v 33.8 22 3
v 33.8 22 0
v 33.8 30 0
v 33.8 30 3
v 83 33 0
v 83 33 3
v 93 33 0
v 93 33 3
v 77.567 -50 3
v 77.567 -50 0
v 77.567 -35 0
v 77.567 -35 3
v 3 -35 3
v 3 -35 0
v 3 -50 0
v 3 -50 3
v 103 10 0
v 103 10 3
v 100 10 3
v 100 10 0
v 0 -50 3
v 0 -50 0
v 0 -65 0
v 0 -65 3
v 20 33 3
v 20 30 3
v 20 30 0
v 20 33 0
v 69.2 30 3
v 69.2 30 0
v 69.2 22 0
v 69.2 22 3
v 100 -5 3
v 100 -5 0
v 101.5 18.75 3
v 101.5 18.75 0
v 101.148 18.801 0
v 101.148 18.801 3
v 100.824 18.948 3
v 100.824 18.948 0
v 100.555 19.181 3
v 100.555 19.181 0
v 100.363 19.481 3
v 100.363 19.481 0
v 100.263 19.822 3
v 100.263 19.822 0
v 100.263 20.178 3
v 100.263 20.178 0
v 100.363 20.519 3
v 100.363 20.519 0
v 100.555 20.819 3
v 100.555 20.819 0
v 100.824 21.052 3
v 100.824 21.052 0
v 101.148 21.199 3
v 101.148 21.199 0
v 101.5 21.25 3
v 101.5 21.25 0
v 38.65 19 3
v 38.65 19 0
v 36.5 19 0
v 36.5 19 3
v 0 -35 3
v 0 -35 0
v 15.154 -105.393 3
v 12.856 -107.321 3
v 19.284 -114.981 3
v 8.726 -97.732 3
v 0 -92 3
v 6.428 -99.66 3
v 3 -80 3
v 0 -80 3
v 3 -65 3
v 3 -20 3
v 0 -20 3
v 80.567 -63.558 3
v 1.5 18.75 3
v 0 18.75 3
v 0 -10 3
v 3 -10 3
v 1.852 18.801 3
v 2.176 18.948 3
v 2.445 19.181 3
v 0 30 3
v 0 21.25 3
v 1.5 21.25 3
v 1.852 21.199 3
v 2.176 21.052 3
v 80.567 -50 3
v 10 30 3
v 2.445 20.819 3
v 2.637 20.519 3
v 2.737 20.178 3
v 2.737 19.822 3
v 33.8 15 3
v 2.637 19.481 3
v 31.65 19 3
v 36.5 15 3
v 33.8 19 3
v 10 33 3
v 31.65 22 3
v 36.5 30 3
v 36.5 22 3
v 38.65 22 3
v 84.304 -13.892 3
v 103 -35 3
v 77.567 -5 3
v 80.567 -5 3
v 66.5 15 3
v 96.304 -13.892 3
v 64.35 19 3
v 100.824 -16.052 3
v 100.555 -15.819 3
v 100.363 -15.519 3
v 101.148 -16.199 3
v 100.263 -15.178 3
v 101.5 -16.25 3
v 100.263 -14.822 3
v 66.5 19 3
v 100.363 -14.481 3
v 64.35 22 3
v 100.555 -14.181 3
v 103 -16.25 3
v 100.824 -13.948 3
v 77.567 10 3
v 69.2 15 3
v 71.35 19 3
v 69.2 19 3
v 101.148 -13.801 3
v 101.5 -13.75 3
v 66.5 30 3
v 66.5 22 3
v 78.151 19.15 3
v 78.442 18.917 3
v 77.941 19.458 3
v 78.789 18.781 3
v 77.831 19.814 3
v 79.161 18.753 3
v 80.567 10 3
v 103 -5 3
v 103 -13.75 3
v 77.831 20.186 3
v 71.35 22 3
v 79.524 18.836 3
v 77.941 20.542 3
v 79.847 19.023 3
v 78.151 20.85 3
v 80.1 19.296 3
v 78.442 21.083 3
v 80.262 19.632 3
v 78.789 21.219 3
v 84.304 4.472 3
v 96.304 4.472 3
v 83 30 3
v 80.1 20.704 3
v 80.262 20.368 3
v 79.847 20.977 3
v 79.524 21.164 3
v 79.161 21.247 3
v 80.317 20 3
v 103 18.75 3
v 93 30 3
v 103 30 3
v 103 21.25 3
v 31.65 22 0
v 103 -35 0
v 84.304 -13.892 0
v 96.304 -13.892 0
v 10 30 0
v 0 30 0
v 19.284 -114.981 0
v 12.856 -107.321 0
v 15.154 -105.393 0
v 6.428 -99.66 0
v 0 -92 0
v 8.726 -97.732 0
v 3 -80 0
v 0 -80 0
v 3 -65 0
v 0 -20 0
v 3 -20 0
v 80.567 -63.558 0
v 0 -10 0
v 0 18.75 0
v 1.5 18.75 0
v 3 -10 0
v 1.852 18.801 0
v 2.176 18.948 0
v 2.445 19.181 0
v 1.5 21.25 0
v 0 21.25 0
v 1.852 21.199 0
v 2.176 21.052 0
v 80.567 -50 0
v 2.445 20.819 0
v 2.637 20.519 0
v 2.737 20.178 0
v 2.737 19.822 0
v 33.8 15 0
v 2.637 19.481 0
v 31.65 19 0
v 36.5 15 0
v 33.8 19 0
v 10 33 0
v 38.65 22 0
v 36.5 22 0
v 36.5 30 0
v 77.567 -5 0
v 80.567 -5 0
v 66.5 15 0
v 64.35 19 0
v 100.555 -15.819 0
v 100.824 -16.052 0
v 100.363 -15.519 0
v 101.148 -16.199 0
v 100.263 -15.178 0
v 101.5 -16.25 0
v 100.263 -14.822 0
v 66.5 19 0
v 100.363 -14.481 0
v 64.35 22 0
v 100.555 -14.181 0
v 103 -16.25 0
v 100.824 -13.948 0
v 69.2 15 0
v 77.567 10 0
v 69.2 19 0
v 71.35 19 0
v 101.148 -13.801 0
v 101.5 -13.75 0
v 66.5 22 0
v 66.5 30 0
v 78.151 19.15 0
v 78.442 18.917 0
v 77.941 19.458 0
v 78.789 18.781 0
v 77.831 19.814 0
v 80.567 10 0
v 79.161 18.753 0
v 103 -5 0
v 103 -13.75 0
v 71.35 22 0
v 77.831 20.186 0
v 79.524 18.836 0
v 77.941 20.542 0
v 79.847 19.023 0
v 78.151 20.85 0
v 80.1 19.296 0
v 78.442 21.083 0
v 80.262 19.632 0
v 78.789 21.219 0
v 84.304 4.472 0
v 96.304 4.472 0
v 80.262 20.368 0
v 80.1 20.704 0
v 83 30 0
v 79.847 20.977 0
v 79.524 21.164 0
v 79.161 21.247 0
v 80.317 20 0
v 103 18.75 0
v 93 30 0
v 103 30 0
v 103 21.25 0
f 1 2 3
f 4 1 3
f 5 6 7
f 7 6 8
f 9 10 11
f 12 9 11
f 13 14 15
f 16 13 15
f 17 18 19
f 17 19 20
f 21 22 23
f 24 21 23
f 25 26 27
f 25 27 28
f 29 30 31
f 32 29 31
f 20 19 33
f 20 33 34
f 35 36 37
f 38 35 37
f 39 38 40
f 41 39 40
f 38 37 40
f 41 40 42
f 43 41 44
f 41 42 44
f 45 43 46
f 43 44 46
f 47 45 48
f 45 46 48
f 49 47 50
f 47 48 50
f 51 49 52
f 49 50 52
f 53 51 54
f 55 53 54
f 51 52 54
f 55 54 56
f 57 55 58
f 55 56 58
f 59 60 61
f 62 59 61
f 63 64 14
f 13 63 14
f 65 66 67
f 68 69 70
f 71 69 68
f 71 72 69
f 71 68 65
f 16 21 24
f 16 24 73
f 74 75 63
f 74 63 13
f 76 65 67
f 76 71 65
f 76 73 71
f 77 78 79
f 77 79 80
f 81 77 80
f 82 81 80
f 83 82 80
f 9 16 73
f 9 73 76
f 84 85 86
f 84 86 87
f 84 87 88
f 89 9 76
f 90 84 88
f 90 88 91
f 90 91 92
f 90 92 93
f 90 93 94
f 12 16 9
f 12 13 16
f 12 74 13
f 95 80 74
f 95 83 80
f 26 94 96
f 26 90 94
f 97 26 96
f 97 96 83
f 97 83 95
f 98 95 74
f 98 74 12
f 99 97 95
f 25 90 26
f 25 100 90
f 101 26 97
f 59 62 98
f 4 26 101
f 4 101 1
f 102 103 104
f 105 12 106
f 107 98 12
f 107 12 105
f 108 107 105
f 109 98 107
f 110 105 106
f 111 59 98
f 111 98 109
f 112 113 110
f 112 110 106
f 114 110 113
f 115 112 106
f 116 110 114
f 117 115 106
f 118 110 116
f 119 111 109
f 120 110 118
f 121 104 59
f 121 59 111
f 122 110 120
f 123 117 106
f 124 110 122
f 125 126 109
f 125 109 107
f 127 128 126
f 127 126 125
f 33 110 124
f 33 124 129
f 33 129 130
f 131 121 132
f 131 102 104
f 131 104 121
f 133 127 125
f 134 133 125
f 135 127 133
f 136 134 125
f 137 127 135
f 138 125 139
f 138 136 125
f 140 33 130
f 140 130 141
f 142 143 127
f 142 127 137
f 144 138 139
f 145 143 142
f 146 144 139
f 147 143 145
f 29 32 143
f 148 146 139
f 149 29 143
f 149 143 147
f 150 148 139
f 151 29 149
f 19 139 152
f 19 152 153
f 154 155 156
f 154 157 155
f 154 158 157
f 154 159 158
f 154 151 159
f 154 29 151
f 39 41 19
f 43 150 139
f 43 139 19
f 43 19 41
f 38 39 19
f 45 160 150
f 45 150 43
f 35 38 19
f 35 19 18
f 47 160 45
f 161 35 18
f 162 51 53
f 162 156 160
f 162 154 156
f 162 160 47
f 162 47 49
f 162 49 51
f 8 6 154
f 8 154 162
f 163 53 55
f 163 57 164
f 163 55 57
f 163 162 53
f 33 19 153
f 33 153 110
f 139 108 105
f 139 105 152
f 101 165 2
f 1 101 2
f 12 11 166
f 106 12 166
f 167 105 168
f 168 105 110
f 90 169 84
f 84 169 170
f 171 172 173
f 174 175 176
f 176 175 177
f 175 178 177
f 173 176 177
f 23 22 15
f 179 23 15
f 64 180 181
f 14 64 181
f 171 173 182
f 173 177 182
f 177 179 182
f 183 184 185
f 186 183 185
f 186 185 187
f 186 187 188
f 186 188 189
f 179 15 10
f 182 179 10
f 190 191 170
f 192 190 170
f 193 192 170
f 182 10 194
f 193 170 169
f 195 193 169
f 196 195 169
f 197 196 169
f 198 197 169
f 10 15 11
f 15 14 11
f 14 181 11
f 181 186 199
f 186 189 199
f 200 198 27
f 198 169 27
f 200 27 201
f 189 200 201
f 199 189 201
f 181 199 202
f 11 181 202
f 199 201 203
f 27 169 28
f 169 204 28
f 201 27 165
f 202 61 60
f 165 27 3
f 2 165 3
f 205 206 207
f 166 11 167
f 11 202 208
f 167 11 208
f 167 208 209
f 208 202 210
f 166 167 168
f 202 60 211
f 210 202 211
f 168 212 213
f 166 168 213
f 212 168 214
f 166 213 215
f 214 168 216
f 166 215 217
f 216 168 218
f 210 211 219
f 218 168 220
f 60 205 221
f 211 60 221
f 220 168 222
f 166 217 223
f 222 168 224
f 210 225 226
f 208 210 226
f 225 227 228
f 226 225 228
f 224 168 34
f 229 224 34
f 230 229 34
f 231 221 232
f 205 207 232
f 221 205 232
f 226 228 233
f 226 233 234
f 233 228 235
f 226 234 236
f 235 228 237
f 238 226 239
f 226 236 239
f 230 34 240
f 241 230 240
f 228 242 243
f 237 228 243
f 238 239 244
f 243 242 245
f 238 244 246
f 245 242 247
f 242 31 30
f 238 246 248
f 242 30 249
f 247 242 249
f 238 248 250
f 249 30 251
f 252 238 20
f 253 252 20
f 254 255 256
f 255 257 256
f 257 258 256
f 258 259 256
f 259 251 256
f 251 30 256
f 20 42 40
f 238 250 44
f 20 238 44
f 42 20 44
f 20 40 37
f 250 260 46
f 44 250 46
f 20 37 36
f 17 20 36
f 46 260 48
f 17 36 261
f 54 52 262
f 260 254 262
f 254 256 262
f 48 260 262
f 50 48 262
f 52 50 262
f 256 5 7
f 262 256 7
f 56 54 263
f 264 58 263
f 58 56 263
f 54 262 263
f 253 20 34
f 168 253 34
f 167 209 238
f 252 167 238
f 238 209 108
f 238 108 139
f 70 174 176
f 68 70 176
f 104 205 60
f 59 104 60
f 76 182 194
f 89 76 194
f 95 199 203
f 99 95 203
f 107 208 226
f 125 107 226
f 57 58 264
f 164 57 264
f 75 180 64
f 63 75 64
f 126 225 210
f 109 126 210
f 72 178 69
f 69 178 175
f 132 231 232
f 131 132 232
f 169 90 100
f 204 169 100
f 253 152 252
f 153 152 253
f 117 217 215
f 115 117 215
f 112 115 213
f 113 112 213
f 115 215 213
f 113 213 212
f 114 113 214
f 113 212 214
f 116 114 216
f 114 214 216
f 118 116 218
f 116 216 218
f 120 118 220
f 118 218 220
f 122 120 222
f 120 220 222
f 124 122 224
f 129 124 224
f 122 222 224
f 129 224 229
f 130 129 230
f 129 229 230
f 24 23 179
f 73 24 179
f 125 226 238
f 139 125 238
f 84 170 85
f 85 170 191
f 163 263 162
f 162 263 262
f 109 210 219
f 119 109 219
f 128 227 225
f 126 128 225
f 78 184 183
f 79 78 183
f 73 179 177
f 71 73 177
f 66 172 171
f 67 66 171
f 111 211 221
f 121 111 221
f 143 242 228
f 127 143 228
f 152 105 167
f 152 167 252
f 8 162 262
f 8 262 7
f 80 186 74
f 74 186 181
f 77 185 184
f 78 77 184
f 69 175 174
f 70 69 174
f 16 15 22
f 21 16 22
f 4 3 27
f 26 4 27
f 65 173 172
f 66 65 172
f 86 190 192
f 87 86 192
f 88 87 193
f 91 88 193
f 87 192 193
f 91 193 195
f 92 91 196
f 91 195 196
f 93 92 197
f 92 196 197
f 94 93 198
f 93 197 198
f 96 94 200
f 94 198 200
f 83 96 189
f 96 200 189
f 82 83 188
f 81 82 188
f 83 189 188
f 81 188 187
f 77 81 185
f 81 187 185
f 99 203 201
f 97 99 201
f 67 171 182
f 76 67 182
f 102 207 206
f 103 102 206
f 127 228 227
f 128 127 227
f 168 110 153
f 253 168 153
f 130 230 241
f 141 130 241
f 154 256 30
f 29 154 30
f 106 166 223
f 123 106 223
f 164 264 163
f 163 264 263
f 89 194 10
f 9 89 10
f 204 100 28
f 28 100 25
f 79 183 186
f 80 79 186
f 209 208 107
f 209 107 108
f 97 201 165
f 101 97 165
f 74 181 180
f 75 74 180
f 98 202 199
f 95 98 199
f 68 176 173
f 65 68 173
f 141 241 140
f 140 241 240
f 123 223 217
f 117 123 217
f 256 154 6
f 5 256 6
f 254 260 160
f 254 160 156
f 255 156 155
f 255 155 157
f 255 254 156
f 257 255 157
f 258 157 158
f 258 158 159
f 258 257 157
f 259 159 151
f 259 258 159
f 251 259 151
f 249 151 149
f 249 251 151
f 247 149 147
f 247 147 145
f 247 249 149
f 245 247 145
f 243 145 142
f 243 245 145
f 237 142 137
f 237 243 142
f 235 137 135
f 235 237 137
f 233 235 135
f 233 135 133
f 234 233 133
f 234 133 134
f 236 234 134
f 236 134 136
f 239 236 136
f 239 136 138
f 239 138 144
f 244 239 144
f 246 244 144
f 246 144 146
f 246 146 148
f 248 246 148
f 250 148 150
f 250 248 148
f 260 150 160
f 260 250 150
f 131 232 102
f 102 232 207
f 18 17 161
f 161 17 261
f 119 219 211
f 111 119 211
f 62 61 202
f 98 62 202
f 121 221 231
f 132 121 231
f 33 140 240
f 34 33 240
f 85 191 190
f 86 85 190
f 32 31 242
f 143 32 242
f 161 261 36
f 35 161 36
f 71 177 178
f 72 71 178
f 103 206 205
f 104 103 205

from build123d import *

# Parameters (mm, degrees)
CROQUIS1_W              = 3
CROQUIS1_H              = 15
CROQUIS1_R              = 1.25
SALIENTE_EXTRUIR1_DEPTH = 3
CROQUIS2_W              = 3
CROQUIS2_H              = 15
CORTAR_EXTRUIR1_DEPTH   = 3
CROQUIS3_W              = 10
CROQUIS3_H              = 3
SALIENTE_EXTRUIR2_DEPTH = 3
CROQUIS4_W              = 12
CROQUIS4_H              = 18.363871442
CORTAR_EXTRUIR2_DEPTH   = 3


with BuildPart() as part:
    # Croquis1 → Saliente-Extruir1 (new body)
    with BuildSketch(Plane.XY):
        with BuildLine():
            Line((103, 21.25), (103, 30))
            Line((103, 30), (69.2, 30))
            Line((69.2, 30), (69.2, 22))
            Line((69.2, 22), (71.35, 22))
            Line((71.35, 22), (71.35, 19))
            Line((71.35, 19), (69.2, 19))
            Line((69.2, 19), (69.2, 15))
            Line((69.2, 15), (66.5, 15))
            Line((66.5, 15), (66.5, 19))
            Line((66.5, 19), (64.35, 19))
            Line((64.35, 19), (64.35, 22))
            Line((64.35, 22), (66.5, 22))
            Line((66.5, 22), (66.5, 30))
            Line((66.5, 30), (36.5, 30))
            Line((36.5, 30), (36.5, 22))
            Line((36.5, 22), (38.65, 22))
            Line((38.65, 22), (38.65, 19))
            Line((38.65, 19), (36.5, 19))
            Line((36.5, 19), (36.5, 15))
            Line((36.5, 15), (33.8, 15))
            Line((33.8, 15), (33.8, 19))
            Line((33.8, 19), (31.65, 19))
            Line((31.65, 19), (31.65, 22))
            Line((31.65, 22), (33.8, 22))
            Line((33.8, 22), (33.8, 30))
            Line((33.8, 30), (0, 30))
            Line((0, 30), (0, 21.25))
            Line((0, 21.25), (1.5, 21.25))
            ThreePointArc((1.5, 21.25), (2.75, 20), (1.5, 18.75))
            Line((1.5, 18.75), (0, 18.75))
            Line((0, 18.75), (0, 0))
            Line((0, 0), (0, -10))
            Line((0, -10), (3, -10))
            Line((3, -10), (3, -20))
            Line((3, -20), (0, -20))
            Line((0, -20), (0, -35))
            Line((0, -35), (3, -35))
            Line((3, -35), (3, -50))
            Line((3, -50), (0, -50))
            Line((0, -50), (0, -65))
            Line((0, -65), (3, -65))
            Line((3, -65), (3, -80))
            Line((3, -80), (0, -80))
            Line((0, -80), (0, -92))
            Line((0, -92), (6.427876097, -99.660444431))
            Line((6.427876097, -99.660444431), (8.726009426, -97.732081602))
            Line((8.726009426, -97.732081602), (15.153885523, -105.392526033))
            Line((15.153885523, -105.392526033), (12.855752194, -107.320888862))
            Line((12.855752194, -107.320888862), (19.283628291, -114.981333294))
            Line((19.283628291, -114.981333294), (80.56718374, -63.558324519))
            Line((80.56718374, -63.558324519), (80.56718374, -50))
            Line((80.56718374, -50), (77.56718374, -50))
            Line((77.56718374, -50), (77.56718374, -35))
            Line((77.56718374, -35), (103, -35))
            Line((103, -35), (103, -16.25))
            Line((103, -16.25), (101.5, -16.25))
            ThreePointArc((101.5, -16.25), (100.25, -15), (101.5, -13.75))
            Line((101.5, -13.75), (103, -13.75))
            Line((103, -13.75), (103, 18.75))
            Line((103, 18.75), (101.5, 18.75))
            ThreePointArc((101.5, 18.75), (100.25, 20), (101.5, 21.25))
            Line((101.5, 21.25), (103, 21.25))
        make_face()
        with Locations((79.06718374, 2.5)):
            Rectangle(CROQUIS1_W, CROQUIS1_H, mode=Mode.SUBTRACT)
        with Locations((79.06718374, 20)):
            Circle(CROQUIS1_R, mode=Mode.SUBTRACT)
    extrude(amount=SALIENTE_EXTRUIR1_DEPTH)

    # Croquis2 → Cortar-Extruir1 (cut)
    with BuildSketch(Plane(origin=(103, 0, 0), x_dir=(0, 0, -1), z_dir=(1, 0, 0))):
        with Locations((-1.5, 2.5)):
            Rectangle(CROQUIS2_W, CROQUIS2_H)
    extrude(amount=-CORTAR_EXTRUIR1_DEPTH, mode=Mode.SUBTRACT)

    # Croquis3 → Saliente-Extruir2 (add)
    with BuildSketch(Plane.XY.offset(3)):
        with Locations((15, 31.5)):
            Rectangle(CROQUIS3_W, CROQUIS3_H)
        with Locations((88, 31.5)):
            Rectangle(CROQUIS3_W, CROQUIS3_H)
    extrude(amount=-SALIENTE_EXTRUIR2_DEPTH)

    # Croquis4 → Cortar-Extruir2 (cut)
    with BuildSketch(Plane.XY.offset(3)):
        with Locations((90.304087079, -4.709619469)):
            Rectangle(CROQUIS4_W, CROQUIS4_H)
    extrude(amount=-CORTAR_EXTRUIR2_DEPTH, mode=Mode.SUBTRACT)


solid = part.part
